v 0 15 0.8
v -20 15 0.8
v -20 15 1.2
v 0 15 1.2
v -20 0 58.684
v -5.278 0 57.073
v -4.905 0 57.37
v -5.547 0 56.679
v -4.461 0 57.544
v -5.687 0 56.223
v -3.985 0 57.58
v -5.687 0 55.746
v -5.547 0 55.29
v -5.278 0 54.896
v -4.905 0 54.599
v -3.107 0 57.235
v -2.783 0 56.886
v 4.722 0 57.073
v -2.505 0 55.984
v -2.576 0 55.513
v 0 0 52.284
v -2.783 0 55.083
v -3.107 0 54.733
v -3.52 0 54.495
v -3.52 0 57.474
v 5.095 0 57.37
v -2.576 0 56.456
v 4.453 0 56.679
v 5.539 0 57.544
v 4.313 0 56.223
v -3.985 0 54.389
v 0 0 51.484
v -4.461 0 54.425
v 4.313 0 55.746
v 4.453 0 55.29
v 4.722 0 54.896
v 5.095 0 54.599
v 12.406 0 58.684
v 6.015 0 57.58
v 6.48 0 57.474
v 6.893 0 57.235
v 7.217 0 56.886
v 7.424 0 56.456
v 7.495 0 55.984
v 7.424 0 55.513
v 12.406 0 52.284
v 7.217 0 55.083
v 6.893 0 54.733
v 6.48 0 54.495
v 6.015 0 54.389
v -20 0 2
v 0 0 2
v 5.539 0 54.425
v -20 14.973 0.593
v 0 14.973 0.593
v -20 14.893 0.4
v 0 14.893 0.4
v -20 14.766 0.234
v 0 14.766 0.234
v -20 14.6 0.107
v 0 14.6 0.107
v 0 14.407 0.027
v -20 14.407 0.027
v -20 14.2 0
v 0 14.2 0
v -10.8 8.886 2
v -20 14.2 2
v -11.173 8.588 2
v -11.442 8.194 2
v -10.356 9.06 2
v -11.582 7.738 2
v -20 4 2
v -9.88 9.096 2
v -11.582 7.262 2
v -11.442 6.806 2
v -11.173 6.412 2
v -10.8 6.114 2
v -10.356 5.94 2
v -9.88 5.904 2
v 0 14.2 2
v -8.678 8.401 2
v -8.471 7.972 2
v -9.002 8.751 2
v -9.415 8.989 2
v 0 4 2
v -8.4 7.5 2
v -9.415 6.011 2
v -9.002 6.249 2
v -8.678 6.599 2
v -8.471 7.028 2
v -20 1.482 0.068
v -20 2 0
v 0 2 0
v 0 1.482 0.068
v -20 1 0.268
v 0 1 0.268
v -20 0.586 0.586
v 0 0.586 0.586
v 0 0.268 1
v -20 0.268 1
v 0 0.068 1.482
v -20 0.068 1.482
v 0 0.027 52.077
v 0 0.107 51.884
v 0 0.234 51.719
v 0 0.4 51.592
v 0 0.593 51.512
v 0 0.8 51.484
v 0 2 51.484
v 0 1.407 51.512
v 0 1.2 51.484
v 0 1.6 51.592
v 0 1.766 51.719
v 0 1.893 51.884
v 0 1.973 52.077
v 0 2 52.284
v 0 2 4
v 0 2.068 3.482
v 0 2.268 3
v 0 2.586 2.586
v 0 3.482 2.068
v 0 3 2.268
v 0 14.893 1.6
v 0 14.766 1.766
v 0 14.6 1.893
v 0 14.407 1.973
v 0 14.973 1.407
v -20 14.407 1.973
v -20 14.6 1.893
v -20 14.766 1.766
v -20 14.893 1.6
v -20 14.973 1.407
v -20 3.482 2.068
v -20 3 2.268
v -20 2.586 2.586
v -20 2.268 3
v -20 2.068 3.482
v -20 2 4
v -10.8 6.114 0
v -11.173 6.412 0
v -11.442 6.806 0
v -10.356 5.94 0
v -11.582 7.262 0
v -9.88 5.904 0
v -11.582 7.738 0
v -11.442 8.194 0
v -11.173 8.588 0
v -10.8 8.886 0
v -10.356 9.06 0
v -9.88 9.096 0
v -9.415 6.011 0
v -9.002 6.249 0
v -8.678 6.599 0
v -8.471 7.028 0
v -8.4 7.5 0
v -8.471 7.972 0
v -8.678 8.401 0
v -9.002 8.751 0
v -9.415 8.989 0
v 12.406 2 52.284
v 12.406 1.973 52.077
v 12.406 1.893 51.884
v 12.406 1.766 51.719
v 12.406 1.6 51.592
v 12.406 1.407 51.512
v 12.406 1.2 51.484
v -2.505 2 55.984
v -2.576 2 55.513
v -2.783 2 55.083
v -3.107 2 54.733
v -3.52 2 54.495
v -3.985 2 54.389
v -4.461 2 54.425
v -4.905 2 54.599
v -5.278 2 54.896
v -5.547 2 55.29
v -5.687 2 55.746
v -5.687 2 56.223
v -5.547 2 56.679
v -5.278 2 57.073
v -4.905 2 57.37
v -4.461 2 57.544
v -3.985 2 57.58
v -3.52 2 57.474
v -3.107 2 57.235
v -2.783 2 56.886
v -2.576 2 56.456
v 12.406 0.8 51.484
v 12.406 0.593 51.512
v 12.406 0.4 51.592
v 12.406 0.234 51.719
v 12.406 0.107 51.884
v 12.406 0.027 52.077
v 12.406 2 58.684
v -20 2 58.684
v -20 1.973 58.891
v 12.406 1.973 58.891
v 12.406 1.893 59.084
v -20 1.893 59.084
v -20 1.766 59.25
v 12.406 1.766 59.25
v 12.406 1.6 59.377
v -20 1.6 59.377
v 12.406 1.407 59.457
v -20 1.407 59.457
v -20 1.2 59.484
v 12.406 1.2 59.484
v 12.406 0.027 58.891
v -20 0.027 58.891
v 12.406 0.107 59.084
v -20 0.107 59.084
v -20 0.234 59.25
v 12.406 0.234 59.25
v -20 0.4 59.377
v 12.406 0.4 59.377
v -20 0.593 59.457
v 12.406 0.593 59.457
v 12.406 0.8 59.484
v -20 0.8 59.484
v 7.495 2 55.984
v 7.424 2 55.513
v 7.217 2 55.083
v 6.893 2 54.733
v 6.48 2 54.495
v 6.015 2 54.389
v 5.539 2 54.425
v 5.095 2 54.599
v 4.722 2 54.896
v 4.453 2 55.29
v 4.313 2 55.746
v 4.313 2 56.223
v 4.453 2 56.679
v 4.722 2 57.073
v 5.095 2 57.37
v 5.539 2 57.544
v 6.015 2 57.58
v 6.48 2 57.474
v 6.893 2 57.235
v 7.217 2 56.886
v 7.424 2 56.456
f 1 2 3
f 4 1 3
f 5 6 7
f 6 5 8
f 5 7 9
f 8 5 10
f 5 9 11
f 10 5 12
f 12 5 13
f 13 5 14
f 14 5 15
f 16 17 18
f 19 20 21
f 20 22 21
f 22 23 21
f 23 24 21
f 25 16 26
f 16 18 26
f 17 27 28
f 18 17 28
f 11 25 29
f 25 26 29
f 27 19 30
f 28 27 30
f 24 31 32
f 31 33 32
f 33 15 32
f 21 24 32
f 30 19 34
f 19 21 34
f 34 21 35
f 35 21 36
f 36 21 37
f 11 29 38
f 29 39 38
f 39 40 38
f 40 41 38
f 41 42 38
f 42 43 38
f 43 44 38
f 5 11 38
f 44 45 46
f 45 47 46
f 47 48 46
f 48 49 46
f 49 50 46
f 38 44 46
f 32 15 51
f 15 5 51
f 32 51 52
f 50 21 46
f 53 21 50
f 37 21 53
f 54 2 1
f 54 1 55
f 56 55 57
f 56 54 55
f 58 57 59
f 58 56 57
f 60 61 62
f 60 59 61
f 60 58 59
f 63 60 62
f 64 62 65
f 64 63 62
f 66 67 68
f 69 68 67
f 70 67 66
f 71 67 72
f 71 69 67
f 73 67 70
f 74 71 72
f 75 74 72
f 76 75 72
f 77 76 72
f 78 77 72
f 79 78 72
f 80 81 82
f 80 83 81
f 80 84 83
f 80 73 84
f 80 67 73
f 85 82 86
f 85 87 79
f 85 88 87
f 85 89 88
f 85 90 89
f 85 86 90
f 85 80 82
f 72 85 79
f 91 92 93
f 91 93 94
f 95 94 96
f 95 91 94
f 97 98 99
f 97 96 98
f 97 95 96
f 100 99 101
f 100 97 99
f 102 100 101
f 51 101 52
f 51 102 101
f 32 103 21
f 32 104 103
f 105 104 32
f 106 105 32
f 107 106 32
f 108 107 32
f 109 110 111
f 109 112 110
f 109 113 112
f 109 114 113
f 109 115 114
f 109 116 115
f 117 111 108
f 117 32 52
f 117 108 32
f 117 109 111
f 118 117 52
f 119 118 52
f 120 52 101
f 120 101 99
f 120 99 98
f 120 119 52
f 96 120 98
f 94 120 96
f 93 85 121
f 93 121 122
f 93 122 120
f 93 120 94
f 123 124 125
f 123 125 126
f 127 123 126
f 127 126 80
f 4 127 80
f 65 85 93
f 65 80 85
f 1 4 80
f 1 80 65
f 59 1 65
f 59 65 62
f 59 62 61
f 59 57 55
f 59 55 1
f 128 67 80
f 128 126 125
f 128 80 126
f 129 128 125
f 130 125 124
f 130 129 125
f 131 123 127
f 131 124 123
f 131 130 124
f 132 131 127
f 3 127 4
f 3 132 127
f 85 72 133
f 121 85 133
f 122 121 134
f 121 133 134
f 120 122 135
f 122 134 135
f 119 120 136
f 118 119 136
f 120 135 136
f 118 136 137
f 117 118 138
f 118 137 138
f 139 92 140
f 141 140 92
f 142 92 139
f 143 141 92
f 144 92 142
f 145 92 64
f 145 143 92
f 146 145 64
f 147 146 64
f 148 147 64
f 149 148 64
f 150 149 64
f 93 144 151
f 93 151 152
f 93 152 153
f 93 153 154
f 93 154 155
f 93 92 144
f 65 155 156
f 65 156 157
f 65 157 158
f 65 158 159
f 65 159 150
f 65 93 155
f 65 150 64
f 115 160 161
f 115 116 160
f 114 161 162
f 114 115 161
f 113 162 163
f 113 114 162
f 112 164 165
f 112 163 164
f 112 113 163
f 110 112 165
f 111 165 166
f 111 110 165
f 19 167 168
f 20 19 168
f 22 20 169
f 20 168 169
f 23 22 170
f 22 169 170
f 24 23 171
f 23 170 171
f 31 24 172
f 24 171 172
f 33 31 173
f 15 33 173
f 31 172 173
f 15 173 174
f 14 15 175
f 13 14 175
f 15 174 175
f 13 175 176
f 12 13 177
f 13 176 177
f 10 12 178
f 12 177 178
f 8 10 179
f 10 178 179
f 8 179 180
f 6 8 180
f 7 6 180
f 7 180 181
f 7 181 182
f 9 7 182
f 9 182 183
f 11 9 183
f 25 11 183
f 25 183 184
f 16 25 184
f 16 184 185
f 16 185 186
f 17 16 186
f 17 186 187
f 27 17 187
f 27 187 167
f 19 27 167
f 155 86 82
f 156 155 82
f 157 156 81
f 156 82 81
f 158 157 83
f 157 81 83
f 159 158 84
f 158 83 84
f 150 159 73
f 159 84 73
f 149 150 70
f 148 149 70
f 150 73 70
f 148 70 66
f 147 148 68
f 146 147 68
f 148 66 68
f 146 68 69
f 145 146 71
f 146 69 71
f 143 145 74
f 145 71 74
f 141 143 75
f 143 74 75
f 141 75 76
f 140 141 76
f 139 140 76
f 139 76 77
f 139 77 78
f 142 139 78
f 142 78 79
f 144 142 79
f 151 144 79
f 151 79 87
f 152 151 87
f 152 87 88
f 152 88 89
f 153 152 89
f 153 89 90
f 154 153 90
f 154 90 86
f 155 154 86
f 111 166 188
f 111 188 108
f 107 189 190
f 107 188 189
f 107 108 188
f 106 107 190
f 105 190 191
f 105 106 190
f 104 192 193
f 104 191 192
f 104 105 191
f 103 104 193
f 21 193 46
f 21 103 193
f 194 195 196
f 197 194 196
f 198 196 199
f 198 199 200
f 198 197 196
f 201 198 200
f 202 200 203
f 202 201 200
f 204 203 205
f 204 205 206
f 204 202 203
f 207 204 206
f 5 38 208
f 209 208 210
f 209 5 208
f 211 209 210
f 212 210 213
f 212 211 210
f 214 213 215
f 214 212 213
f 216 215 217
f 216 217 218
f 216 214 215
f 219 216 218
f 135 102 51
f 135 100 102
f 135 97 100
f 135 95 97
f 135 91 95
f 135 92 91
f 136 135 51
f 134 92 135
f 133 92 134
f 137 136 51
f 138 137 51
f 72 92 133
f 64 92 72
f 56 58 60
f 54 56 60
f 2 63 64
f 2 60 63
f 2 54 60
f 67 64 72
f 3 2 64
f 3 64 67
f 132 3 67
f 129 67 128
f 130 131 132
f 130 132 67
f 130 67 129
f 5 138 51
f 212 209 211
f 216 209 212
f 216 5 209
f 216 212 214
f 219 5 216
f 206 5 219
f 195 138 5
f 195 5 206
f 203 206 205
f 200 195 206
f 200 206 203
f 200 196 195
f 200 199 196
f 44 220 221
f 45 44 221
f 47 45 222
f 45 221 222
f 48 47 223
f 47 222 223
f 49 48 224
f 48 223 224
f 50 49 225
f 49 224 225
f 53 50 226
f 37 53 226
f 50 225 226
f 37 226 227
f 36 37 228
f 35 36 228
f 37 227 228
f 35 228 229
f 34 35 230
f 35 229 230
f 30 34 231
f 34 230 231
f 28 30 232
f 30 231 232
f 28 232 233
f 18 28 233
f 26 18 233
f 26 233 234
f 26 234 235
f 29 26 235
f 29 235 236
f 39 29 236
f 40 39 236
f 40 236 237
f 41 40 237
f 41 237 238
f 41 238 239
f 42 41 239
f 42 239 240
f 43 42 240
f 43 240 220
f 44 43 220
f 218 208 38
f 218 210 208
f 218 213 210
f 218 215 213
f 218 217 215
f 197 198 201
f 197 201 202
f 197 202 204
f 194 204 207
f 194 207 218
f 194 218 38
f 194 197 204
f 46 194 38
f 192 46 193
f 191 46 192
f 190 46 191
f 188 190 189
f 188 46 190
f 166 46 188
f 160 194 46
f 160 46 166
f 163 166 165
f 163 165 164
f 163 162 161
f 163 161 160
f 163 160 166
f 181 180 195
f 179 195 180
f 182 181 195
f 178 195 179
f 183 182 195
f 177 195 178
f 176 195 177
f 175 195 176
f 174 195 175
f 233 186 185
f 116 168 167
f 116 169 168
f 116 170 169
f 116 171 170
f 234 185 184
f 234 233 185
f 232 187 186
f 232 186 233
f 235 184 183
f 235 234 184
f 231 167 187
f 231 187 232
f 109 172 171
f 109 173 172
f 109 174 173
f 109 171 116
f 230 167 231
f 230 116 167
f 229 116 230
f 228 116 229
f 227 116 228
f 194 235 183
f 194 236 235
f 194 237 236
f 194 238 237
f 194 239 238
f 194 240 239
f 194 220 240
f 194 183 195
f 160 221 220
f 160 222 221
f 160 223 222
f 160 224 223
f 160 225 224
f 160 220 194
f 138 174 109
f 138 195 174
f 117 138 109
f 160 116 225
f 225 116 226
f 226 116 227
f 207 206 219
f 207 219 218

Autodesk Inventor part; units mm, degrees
ref_plane "YZ Plane" through (0, 0, 0) normal (1, 0, 0) x (0, 1, 0)
ref_plane "XZ Plane" through (0, 0, 0) normal (0, 1, 0) x (-1, 0, 0)
ref_plane "XY Plane" through (0, 0, 0) normal (0, 0, 1) x (1, 0, 0)
sketch "Skizze2" plane through (0, 0, 0) normal (1, 0, 0) x (0, 1, 0)
  line L0 (0, 0) -> (15, 0)
  line L1 (15, 0) -> (15, 2)
  line L2 (15, 2) -> (2, 2)
  line L3 (2, 2) -> (2, 47)
  line L4 (2, 47) -> (0, 47)
  line L5 (0, 47) -> (0, 0)
  dimension "d0" = 2
  dimension "d2" = 45
  dimension "d3" = 2
  dimension "d4" = 90
  dimension "d5" = 15
extrude "Extrusion1" add sketch "Skizze2" against normal blind 20
sketch "Skizze3" plane through (0, 2, 2) normal (0, 0, 1) x (1, 0, 0)
  circle A0 centre (-10, 5.5) radius 1.6
  line L0 (0, 13) -> (0, 0) projected
  line L1 (0, 0) -> (-20, 0) projected
  line L2 (0, -2) -> (-20, -2) projected
  dimension "d8" = 3.2
  dimension "d9" = 10
  dimension "d17" = 7.5
extrude "Extrusion2" cut sketch "Skizze3" against normal through all
sketch "Skizze4" plane through (0, 2, 47) normal (0, 1, 0) x (1, 0, 0)
  line L0 (0, 0) -> (-20, 0) projected
  line L1 (0, -12.4844) -> (12.4058, -12.4844)
  line L2 (12.4058, -12.4844) -> (12.4058, -4.4844)
  line L3 (12.4058, -4.4844) -> (0, -4.4844)
  line L4 (0, -4.4844) -> (0, 0)
  line L5 (0, 0) -> (-20, 0)
  line L6 (-20, 47) -> (-20, 0) projected
  line L7 (-20, 0) -> (-20, -12.4844)
  line L8 (-20, -12.4844) -> (0, -12.4844)
  point P0 (0, 47)
  dimension "d13" = 8
extrude "Extrusion3" add sketch "Skizze4" against normal blind 2
sketch "Skizze5" plane through (-20, 2, 2) normal (0, 1, 0) x (1, 0, 0)
  circle A0 centre (25.895, -53.9844) radius 1.6
  circle A1 centre (15.895, -53.9844) radius 1.6
  line L0 (0, -57.4844) -> (32.4058, -57.4844) projected
  point P0 (20, 2)
  dimension "d18" = 3.2
  dimension "d19" = 3.2
  dimension "d20" = 10
  dimension "d21" = 3.5
  dimension "d22" = 3.5
extrude "Extrusion4" cut sketch "Skizze5" against normal through all
fillet "Rundung1" radius 2 2 edges at (-10, 2, 2) (-10, 0, 0)
fillet "Rundung2" radius 0.8 6 edges at (-3.7971, 2, 59.4844) (-3.7971, 0, 59.4844) (6.2029, 2, 51.4844) (-10, 15, 2) (-10, 15, 0) (6.2029, 0, 51.4844)
properties part number "X-Endstop holder mount" material "ABS-Kunststoff"
